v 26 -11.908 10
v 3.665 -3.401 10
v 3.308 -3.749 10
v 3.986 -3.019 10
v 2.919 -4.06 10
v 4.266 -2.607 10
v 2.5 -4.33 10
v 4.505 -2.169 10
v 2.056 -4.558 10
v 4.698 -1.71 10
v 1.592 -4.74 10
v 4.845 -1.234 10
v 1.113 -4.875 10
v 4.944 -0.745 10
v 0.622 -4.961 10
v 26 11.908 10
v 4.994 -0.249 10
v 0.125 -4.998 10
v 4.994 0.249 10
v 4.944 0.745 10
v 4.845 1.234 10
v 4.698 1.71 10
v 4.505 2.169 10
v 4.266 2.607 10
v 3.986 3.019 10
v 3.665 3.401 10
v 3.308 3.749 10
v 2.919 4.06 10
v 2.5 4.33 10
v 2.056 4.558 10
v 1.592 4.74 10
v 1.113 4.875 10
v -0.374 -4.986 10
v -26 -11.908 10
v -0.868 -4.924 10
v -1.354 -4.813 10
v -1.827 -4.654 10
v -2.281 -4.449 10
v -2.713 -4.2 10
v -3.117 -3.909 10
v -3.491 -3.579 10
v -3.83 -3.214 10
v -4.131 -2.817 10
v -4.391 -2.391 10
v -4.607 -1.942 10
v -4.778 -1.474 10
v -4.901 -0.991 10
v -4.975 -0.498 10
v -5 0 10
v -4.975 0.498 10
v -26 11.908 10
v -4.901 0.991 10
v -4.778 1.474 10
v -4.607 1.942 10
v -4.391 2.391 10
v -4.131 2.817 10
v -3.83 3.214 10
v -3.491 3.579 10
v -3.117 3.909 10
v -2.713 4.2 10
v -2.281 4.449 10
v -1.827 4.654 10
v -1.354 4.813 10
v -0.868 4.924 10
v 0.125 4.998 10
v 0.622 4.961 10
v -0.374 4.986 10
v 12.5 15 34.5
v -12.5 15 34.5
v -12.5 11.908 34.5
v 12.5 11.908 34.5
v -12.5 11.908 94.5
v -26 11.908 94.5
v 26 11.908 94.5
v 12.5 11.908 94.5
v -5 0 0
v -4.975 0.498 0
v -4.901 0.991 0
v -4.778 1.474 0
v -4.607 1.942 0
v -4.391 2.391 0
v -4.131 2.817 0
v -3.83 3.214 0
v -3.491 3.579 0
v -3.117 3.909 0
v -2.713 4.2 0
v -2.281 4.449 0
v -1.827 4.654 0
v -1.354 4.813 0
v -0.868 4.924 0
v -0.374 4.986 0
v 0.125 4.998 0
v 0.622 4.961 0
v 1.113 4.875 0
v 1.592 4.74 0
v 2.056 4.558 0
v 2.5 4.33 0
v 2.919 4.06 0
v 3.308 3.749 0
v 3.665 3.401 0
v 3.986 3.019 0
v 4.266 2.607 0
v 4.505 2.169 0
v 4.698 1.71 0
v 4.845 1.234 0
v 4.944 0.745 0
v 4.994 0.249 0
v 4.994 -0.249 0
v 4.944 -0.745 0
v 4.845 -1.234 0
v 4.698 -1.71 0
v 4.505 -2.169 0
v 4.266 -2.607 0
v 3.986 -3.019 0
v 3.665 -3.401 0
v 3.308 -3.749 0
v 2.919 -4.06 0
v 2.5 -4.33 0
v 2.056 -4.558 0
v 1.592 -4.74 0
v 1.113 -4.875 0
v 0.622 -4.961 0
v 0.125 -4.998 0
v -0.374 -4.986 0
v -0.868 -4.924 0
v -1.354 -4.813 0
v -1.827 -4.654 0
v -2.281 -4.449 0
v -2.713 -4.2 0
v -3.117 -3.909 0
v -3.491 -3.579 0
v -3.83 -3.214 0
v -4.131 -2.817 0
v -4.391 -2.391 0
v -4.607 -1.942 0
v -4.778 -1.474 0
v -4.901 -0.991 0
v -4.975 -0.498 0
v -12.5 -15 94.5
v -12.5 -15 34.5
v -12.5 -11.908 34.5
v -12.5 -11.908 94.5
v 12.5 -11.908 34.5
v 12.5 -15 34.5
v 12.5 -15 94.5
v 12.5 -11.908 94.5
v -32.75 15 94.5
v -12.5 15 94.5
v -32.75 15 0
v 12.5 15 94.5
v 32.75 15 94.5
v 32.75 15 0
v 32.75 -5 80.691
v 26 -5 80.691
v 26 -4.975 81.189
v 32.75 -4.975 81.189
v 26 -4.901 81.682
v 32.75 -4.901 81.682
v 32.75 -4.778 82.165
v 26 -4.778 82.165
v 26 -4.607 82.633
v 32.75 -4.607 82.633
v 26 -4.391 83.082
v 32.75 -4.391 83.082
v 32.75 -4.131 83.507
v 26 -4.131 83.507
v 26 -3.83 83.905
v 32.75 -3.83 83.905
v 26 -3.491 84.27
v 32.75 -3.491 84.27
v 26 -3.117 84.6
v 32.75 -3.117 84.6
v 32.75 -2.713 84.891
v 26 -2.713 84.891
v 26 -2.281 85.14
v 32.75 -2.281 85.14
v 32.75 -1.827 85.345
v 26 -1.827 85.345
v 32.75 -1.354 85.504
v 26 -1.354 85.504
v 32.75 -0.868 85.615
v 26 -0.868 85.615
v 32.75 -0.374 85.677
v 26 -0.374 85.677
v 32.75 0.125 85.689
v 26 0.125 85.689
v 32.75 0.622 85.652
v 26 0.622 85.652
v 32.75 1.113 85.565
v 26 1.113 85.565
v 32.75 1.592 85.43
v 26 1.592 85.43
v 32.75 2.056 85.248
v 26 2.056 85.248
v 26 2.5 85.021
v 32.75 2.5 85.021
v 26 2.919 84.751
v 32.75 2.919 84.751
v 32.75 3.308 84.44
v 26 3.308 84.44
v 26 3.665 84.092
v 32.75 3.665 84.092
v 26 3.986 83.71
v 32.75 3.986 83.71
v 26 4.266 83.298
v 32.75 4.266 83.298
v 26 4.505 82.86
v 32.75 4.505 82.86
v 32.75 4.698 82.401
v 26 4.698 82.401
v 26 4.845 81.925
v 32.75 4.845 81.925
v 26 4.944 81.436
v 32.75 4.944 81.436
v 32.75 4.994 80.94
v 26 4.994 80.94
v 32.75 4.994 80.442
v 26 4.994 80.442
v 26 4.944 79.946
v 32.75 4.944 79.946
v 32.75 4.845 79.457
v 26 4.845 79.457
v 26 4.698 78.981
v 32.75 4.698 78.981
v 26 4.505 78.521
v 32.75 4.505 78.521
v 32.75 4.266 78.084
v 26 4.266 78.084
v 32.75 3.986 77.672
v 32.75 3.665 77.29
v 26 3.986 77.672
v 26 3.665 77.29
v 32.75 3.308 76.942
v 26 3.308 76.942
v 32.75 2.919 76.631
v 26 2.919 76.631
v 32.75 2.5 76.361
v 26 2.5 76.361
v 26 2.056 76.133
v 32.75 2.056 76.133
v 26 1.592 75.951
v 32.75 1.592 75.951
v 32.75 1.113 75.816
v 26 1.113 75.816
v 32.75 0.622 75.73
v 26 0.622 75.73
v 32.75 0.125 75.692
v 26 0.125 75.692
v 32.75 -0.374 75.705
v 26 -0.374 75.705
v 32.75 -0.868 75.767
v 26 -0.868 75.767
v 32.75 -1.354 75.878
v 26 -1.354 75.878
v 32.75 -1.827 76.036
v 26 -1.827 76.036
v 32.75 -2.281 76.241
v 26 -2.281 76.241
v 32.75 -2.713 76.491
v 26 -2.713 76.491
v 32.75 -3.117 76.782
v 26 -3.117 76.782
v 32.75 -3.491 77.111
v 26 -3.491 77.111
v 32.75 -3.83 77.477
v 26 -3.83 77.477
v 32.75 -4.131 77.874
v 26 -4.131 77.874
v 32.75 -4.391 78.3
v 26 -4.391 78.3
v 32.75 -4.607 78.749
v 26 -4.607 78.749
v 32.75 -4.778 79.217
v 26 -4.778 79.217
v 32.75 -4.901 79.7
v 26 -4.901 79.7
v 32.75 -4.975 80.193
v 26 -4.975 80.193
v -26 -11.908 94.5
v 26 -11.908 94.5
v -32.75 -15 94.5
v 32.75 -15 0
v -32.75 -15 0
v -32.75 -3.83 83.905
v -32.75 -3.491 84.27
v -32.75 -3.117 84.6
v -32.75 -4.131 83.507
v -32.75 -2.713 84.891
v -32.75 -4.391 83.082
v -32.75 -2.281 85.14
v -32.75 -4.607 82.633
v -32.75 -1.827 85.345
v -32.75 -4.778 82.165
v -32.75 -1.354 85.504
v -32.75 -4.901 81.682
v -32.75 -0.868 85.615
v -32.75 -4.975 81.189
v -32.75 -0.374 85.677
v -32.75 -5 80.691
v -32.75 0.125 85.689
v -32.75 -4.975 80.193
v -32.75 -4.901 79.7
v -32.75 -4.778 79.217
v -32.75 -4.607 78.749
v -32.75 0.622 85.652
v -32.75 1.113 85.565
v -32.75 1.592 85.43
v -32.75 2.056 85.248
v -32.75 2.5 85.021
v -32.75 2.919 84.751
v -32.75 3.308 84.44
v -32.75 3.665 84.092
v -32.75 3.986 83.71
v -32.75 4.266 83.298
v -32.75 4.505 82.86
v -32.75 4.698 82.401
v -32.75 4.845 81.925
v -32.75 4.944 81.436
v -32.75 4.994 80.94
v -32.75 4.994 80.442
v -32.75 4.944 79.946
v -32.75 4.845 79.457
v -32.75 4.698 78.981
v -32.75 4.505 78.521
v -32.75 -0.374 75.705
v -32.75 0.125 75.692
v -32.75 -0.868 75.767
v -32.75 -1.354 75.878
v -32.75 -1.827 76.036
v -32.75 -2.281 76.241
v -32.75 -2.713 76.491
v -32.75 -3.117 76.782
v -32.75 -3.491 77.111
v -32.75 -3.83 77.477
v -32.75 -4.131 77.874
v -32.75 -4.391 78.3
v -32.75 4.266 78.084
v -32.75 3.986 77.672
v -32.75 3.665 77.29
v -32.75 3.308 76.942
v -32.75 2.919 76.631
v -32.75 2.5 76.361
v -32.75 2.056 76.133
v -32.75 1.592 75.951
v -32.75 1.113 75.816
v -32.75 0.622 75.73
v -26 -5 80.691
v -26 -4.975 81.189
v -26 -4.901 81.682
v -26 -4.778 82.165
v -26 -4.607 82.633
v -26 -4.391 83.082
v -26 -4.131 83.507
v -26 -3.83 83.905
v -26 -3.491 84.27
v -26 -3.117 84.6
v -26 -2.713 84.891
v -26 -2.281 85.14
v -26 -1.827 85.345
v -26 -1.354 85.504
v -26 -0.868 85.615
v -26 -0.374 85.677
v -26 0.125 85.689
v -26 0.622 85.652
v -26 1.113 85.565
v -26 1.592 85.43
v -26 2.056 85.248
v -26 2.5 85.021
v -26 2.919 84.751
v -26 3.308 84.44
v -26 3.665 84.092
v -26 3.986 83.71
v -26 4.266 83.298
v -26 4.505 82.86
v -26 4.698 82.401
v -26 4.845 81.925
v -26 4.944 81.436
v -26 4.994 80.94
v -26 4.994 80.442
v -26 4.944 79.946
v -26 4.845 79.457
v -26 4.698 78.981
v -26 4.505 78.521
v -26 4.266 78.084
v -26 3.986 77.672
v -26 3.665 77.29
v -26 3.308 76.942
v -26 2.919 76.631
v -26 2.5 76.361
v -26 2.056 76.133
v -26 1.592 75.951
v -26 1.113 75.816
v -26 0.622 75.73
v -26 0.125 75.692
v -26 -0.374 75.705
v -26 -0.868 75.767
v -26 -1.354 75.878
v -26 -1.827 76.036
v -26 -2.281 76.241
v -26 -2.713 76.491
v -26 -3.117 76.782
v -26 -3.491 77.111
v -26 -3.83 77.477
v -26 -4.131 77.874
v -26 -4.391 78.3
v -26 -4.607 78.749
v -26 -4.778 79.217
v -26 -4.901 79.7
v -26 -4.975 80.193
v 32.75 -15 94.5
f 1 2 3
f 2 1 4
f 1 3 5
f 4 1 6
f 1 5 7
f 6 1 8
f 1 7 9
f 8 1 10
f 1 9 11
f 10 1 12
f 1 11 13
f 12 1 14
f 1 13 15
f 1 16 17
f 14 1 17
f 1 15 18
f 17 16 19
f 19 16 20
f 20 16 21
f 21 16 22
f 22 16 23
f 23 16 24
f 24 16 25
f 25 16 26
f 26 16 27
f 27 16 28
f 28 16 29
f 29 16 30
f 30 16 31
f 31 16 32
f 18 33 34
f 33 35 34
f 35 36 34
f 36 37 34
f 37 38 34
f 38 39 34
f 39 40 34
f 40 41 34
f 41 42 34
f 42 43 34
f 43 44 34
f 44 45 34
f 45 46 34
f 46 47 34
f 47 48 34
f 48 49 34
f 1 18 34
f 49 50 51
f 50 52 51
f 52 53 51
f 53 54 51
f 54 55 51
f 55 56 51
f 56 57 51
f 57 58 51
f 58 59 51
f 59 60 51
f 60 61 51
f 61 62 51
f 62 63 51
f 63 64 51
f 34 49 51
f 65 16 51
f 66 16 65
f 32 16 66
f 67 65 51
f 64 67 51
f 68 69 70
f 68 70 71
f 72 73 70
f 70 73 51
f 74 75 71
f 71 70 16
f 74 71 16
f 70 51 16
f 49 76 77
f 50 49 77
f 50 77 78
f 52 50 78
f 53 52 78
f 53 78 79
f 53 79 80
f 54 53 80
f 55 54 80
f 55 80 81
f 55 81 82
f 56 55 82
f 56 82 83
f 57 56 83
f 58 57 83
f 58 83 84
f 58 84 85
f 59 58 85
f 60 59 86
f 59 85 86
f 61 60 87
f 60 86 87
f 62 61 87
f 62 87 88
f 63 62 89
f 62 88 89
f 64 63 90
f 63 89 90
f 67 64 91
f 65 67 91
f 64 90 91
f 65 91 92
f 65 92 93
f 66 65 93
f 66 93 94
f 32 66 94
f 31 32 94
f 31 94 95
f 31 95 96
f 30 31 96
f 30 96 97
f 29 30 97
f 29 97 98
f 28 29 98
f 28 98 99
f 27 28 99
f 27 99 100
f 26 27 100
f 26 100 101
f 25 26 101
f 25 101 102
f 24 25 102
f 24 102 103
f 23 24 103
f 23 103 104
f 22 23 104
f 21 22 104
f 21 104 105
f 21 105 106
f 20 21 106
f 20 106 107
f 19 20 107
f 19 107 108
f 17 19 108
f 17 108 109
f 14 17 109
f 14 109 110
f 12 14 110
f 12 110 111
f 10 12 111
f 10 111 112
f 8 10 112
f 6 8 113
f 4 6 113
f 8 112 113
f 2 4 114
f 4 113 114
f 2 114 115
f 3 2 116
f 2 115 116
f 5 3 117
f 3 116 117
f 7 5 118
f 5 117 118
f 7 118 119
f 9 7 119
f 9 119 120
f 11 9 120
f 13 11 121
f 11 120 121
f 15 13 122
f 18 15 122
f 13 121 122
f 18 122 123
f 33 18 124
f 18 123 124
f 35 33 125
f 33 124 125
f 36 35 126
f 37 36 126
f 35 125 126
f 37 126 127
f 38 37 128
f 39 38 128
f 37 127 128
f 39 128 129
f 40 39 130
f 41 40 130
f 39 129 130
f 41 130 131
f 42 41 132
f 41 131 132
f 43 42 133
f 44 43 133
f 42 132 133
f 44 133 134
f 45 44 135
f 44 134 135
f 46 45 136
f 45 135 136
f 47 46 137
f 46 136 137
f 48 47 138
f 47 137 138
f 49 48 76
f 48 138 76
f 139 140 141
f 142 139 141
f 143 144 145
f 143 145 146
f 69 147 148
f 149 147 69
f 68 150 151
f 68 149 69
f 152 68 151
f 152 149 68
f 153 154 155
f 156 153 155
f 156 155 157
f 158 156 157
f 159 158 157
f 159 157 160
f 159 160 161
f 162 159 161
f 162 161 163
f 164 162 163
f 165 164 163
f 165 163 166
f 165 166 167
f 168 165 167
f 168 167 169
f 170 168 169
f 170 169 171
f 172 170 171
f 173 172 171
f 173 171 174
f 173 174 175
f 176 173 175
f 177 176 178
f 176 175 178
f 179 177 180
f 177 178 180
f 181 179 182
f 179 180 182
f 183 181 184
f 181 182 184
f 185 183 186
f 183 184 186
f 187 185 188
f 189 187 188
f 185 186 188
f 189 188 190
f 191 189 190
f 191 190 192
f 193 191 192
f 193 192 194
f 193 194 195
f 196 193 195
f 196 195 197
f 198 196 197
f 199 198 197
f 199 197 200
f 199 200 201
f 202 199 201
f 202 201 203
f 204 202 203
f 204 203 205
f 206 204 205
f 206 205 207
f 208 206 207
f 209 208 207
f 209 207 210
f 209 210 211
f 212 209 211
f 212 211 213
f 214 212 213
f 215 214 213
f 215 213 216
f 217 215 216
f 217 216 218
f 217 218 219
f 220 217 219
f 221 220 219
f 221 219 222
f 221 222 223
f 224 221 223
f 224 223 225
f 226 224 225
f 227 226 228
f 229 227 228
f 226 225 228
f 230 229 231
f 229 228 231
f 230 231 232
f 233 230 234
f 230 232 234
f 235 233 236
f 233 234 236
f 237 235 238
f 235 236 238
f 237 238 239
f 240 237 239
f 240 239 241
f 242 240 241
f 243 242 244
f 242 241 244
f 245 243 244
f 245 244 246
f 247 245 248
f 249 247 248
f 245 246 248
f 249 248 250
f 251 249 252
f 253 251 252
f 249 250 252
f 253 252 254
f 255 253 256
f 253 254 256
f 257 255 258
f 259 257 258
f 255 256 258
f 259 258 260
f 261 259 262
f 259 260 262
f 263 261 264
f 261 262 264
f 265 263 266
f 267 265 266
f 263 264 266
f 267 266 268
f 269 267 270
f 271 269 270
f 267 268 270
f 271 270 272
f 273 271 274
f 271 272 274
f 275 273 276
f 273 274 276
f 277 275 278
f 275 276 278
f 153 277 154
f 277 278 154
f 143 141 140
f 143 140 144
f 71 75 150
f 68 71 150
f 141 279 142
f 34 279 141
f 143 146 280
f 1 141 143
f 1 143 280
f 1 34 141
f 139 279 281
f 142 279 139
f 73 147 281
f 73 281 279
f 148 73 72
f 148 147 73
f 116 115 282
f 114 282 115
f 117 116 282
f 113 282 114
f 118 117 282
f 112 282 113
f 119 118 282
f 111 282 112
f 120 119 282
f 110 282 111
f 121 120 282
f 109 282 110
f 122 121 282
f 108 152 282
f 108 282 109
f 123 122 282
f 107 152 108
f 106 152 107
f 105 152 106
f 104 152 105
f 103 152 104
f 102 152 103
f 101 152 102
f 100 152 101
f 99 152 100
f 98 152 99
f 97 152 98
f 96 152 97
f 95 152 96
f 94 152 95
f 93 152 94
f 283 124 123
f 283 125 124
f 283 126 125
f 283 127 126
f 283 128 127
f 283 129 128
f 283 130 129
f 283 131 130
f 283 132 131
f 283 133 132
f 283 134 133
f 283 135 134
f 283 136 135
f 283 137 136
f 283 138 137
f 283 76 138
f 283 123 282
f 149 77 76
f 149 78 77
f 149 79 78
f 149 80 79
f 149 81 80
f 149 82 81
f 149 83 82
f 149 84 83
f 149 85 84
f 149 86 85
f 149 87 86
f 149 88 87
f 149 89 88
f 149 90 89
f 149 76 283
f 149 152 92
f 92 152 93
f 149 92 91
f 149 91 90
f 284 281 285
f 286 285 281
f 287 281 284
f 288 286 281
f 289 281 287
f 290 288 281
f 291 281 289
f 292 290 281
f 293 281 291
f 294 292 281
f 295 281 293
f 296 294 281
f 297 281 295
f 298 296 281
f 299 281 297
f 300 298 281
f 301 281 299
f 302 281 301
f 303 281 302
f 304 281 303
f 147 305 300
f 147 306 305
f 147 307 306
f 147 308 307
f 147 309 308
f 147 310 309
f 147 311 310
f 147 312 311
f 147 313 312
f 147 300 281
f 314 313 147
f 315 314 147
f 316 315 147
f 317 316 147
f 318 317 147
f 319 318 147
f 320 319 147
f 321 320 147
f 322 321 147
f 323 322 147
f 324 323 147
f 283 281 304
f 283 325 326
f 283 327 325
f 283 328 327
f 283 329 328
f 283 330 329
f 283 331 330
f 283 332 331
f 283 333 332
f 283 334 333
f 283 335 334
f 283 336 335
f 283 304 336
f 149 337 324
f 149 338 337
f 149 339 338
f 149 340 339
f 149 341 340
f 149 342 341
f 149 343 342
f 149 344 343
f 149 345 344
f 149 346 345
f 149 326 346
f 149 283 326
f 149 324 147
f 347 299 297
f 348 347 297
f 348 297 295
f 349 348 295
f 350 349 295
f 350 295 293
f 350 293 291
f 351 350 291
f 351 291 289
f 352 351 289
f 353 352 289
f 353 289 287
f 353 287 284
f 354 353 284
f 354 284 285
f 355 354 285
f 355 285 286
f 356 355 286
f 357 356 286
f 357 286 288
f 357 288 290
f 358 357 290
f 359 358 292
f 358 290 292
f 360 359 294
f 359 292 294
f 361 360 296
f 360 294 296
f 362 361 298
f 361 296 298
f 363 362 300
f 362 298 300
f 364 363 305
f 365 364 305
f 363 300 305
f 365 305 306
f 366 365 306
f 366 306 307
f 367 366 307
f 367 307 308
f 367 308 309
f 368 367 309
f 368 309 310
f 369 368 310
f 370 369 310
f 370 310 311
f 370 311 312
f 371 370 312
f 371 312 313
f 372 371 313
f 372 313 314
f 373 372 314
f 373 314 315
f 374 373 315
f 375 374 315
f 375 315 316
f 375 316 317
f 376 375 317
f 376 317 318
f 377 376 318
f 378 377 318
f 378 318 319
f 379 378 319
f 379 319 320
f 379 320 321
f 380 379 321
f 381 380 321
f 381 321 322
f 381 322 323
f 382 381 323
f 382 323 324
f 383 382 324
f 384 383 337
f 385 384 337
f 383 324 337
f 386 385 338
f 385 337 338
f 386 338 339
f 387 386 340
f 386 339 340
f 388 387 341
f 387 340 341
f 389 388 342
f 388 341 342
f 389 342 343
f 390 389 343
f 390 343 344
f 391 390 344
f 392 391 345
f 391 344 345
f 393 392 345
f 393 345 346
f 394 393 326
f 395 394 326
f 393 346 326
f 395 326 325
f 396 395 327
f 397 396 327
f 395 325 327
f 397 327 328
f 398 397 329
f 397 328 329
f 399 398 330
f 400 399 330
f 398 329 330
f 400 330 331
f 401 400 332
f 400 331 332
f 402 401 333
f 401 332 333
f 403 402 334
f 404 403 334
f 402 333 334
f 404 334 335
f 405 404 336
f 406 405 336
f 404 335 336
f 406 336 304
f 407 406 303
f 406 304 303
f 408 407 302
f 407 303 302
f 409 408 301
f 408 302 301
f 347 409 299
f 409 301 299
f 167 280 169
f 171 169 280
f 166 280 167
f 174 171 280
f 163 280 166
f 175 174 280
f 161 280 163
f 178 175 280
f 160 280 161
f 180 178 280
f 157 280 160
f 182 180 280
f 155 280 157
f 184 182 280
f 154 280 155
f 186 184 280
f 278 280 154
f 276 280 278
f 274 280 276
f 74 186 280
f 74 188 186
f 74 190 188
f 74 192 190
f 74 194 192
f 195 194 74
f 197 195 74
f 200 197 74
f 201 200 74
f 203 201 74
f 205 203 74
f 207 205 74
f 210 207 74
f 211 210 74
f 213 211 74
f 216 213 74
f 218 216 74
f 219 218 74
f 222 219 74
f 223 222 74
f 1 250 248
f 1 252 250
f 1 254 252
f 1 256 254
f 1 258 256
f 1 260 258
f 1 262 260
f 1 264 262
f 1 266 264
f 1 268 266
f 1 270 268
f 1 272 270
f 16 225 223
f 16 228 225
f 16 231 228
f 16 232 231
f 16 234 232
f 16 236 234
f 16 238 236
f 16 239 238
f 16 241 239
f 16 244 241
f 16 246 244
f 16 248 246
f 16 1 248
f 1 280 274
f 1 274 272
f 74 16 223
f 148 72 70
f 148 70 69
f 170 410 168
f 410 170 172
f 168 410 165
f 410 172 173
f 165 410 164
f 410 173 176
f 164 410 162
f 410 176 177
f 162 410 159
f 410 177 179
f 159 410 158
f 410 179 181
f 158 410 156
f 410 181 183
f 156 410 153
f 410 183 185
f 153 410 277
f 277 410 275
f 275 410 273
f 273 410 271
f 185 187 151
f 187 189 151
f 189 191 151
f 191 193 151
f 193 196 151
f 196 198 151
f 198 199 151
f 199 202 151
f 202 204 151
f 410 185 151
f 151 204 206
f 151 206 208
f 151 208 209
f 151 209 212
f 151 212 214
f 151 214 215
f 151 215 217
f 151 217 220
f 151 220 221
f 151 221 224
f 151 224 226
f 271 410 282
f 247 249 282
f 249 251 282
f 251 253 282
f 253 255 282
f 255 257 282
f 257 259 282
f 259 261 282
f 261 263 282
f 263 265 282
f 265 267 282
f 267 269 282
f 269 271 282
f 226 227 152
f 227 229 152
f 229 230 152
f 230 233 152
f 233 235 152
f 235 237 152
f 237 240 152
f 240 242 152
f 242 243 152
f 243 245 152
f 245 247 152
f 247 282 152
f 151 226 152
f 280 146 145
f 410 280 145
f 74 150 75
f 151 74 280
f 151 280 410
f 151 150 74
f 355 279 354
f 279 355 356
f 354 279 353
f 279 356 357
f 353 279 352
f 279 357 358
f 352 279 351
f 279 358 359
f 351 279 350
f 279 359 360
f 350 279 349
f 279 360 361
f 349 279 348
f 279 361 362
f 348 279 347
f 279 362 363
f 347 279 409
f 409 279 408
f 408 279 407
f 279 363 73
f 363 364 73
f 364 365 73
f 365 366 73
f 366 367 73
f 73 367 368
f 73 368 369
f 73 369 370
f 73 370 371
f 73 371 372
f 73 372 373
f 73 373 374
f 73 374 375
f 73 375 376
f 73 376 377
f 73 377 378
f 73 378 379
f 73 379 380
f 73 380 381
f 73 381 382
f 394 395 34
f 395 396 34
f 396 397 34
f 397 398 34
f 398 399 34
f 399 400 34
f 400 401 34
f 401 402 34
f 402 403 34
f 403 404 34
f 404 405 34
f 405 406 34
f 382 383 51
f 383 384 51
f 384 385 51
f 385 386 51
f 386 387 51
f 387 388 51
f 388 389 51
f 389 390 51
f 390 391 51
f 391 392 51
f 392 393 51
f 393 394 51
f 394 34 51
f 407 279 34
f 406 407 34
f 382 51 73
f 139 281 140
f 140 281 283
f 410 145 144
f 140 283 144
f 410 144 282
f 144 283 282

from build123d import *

# Parameters (mm, degrees)
SKETCH2_W           = 65.5
SKETCH2_H           = 30
SKETCH2_W_2         = 52
SKETCH2_H_2         = 23.816793894
BOSS_EXTRUDE1_DEPTH = 94.5
SKETCH3_W           = 52
SKETCH3_H           = 23.816793894
BOSS_EXTRUDE2_DEPTH = 10
SKETCH4_W           = 25
SKETCH4_H           = 30
CUT_EXTRUDE1_DEPTH  = 60
SKETCH5_R           = 5
CUT_EXTRUDE2_DEPTH  = 116.954732547
SKETCH6_R           = 5
CUT_EXTRUDE3_DEPTH  = 102.132648042


with BuildPart() as part:
    # Sketch2 → Boss-Extrude1 (new body)
    with BuildSketch(Plane.XY):
        Rectangle(SKETCH2_W, SKETCH2_H)
        Rectangle(SKETCH2_W_2, SKETCH2_H_2, mode=Mode.SUBTRACT)
    extrude(amount=BOSS_EXTRUDE1_DEPTH)

    # Sketch3 → Boss-Extrude2 (add)
    with BuildSketch(Plane(origin=(0, 0, 0), x_dir=(-1, 0, 0), z_dir=(0, 0, -1))):
        Rectangle(SKETCH3_W, SKETCH3_H)
    extrude(amount=-BOSS_EXTRUDE2_DEPTH)

    # Sketch4 → Cut-Extrude1 (cut)
    with BuildSketch(Plane.XY.offset(94.5)):
        Rectangle(SKETCH4_W, SKETCH4_H)
    extrude(amount=-CUT_EXTRUDE1_DEPTH, mode=Mode.SUBTRACT)

    # Sketch5 → Cut-Extrude2 (cut, through all)
    with BuildSketch(Plane.ZY.offset(32.75)):
        with Locations(Location((80.690823626, 0, 0), (0, 0, 270))):
            Circle(SKETCH5_R)
    extrude(amount=-CUT_EXTRUDE2_DEPTH, mode=Mode.SUBTRACT)

    # Sketch6 → Cut-Extrude3 (cut, through all)
    with BuildSketch(Plane(origin=(0, 0, 0), x_dir=(-1, 0, 0), z_dir=(0, 0, -1))):
        Circle(SKETCH6_R)
    extrude(amount=-CUT_EXTRUDE3_DEPTH, mode=Mode.SUBTRACT)


solid = part.part
